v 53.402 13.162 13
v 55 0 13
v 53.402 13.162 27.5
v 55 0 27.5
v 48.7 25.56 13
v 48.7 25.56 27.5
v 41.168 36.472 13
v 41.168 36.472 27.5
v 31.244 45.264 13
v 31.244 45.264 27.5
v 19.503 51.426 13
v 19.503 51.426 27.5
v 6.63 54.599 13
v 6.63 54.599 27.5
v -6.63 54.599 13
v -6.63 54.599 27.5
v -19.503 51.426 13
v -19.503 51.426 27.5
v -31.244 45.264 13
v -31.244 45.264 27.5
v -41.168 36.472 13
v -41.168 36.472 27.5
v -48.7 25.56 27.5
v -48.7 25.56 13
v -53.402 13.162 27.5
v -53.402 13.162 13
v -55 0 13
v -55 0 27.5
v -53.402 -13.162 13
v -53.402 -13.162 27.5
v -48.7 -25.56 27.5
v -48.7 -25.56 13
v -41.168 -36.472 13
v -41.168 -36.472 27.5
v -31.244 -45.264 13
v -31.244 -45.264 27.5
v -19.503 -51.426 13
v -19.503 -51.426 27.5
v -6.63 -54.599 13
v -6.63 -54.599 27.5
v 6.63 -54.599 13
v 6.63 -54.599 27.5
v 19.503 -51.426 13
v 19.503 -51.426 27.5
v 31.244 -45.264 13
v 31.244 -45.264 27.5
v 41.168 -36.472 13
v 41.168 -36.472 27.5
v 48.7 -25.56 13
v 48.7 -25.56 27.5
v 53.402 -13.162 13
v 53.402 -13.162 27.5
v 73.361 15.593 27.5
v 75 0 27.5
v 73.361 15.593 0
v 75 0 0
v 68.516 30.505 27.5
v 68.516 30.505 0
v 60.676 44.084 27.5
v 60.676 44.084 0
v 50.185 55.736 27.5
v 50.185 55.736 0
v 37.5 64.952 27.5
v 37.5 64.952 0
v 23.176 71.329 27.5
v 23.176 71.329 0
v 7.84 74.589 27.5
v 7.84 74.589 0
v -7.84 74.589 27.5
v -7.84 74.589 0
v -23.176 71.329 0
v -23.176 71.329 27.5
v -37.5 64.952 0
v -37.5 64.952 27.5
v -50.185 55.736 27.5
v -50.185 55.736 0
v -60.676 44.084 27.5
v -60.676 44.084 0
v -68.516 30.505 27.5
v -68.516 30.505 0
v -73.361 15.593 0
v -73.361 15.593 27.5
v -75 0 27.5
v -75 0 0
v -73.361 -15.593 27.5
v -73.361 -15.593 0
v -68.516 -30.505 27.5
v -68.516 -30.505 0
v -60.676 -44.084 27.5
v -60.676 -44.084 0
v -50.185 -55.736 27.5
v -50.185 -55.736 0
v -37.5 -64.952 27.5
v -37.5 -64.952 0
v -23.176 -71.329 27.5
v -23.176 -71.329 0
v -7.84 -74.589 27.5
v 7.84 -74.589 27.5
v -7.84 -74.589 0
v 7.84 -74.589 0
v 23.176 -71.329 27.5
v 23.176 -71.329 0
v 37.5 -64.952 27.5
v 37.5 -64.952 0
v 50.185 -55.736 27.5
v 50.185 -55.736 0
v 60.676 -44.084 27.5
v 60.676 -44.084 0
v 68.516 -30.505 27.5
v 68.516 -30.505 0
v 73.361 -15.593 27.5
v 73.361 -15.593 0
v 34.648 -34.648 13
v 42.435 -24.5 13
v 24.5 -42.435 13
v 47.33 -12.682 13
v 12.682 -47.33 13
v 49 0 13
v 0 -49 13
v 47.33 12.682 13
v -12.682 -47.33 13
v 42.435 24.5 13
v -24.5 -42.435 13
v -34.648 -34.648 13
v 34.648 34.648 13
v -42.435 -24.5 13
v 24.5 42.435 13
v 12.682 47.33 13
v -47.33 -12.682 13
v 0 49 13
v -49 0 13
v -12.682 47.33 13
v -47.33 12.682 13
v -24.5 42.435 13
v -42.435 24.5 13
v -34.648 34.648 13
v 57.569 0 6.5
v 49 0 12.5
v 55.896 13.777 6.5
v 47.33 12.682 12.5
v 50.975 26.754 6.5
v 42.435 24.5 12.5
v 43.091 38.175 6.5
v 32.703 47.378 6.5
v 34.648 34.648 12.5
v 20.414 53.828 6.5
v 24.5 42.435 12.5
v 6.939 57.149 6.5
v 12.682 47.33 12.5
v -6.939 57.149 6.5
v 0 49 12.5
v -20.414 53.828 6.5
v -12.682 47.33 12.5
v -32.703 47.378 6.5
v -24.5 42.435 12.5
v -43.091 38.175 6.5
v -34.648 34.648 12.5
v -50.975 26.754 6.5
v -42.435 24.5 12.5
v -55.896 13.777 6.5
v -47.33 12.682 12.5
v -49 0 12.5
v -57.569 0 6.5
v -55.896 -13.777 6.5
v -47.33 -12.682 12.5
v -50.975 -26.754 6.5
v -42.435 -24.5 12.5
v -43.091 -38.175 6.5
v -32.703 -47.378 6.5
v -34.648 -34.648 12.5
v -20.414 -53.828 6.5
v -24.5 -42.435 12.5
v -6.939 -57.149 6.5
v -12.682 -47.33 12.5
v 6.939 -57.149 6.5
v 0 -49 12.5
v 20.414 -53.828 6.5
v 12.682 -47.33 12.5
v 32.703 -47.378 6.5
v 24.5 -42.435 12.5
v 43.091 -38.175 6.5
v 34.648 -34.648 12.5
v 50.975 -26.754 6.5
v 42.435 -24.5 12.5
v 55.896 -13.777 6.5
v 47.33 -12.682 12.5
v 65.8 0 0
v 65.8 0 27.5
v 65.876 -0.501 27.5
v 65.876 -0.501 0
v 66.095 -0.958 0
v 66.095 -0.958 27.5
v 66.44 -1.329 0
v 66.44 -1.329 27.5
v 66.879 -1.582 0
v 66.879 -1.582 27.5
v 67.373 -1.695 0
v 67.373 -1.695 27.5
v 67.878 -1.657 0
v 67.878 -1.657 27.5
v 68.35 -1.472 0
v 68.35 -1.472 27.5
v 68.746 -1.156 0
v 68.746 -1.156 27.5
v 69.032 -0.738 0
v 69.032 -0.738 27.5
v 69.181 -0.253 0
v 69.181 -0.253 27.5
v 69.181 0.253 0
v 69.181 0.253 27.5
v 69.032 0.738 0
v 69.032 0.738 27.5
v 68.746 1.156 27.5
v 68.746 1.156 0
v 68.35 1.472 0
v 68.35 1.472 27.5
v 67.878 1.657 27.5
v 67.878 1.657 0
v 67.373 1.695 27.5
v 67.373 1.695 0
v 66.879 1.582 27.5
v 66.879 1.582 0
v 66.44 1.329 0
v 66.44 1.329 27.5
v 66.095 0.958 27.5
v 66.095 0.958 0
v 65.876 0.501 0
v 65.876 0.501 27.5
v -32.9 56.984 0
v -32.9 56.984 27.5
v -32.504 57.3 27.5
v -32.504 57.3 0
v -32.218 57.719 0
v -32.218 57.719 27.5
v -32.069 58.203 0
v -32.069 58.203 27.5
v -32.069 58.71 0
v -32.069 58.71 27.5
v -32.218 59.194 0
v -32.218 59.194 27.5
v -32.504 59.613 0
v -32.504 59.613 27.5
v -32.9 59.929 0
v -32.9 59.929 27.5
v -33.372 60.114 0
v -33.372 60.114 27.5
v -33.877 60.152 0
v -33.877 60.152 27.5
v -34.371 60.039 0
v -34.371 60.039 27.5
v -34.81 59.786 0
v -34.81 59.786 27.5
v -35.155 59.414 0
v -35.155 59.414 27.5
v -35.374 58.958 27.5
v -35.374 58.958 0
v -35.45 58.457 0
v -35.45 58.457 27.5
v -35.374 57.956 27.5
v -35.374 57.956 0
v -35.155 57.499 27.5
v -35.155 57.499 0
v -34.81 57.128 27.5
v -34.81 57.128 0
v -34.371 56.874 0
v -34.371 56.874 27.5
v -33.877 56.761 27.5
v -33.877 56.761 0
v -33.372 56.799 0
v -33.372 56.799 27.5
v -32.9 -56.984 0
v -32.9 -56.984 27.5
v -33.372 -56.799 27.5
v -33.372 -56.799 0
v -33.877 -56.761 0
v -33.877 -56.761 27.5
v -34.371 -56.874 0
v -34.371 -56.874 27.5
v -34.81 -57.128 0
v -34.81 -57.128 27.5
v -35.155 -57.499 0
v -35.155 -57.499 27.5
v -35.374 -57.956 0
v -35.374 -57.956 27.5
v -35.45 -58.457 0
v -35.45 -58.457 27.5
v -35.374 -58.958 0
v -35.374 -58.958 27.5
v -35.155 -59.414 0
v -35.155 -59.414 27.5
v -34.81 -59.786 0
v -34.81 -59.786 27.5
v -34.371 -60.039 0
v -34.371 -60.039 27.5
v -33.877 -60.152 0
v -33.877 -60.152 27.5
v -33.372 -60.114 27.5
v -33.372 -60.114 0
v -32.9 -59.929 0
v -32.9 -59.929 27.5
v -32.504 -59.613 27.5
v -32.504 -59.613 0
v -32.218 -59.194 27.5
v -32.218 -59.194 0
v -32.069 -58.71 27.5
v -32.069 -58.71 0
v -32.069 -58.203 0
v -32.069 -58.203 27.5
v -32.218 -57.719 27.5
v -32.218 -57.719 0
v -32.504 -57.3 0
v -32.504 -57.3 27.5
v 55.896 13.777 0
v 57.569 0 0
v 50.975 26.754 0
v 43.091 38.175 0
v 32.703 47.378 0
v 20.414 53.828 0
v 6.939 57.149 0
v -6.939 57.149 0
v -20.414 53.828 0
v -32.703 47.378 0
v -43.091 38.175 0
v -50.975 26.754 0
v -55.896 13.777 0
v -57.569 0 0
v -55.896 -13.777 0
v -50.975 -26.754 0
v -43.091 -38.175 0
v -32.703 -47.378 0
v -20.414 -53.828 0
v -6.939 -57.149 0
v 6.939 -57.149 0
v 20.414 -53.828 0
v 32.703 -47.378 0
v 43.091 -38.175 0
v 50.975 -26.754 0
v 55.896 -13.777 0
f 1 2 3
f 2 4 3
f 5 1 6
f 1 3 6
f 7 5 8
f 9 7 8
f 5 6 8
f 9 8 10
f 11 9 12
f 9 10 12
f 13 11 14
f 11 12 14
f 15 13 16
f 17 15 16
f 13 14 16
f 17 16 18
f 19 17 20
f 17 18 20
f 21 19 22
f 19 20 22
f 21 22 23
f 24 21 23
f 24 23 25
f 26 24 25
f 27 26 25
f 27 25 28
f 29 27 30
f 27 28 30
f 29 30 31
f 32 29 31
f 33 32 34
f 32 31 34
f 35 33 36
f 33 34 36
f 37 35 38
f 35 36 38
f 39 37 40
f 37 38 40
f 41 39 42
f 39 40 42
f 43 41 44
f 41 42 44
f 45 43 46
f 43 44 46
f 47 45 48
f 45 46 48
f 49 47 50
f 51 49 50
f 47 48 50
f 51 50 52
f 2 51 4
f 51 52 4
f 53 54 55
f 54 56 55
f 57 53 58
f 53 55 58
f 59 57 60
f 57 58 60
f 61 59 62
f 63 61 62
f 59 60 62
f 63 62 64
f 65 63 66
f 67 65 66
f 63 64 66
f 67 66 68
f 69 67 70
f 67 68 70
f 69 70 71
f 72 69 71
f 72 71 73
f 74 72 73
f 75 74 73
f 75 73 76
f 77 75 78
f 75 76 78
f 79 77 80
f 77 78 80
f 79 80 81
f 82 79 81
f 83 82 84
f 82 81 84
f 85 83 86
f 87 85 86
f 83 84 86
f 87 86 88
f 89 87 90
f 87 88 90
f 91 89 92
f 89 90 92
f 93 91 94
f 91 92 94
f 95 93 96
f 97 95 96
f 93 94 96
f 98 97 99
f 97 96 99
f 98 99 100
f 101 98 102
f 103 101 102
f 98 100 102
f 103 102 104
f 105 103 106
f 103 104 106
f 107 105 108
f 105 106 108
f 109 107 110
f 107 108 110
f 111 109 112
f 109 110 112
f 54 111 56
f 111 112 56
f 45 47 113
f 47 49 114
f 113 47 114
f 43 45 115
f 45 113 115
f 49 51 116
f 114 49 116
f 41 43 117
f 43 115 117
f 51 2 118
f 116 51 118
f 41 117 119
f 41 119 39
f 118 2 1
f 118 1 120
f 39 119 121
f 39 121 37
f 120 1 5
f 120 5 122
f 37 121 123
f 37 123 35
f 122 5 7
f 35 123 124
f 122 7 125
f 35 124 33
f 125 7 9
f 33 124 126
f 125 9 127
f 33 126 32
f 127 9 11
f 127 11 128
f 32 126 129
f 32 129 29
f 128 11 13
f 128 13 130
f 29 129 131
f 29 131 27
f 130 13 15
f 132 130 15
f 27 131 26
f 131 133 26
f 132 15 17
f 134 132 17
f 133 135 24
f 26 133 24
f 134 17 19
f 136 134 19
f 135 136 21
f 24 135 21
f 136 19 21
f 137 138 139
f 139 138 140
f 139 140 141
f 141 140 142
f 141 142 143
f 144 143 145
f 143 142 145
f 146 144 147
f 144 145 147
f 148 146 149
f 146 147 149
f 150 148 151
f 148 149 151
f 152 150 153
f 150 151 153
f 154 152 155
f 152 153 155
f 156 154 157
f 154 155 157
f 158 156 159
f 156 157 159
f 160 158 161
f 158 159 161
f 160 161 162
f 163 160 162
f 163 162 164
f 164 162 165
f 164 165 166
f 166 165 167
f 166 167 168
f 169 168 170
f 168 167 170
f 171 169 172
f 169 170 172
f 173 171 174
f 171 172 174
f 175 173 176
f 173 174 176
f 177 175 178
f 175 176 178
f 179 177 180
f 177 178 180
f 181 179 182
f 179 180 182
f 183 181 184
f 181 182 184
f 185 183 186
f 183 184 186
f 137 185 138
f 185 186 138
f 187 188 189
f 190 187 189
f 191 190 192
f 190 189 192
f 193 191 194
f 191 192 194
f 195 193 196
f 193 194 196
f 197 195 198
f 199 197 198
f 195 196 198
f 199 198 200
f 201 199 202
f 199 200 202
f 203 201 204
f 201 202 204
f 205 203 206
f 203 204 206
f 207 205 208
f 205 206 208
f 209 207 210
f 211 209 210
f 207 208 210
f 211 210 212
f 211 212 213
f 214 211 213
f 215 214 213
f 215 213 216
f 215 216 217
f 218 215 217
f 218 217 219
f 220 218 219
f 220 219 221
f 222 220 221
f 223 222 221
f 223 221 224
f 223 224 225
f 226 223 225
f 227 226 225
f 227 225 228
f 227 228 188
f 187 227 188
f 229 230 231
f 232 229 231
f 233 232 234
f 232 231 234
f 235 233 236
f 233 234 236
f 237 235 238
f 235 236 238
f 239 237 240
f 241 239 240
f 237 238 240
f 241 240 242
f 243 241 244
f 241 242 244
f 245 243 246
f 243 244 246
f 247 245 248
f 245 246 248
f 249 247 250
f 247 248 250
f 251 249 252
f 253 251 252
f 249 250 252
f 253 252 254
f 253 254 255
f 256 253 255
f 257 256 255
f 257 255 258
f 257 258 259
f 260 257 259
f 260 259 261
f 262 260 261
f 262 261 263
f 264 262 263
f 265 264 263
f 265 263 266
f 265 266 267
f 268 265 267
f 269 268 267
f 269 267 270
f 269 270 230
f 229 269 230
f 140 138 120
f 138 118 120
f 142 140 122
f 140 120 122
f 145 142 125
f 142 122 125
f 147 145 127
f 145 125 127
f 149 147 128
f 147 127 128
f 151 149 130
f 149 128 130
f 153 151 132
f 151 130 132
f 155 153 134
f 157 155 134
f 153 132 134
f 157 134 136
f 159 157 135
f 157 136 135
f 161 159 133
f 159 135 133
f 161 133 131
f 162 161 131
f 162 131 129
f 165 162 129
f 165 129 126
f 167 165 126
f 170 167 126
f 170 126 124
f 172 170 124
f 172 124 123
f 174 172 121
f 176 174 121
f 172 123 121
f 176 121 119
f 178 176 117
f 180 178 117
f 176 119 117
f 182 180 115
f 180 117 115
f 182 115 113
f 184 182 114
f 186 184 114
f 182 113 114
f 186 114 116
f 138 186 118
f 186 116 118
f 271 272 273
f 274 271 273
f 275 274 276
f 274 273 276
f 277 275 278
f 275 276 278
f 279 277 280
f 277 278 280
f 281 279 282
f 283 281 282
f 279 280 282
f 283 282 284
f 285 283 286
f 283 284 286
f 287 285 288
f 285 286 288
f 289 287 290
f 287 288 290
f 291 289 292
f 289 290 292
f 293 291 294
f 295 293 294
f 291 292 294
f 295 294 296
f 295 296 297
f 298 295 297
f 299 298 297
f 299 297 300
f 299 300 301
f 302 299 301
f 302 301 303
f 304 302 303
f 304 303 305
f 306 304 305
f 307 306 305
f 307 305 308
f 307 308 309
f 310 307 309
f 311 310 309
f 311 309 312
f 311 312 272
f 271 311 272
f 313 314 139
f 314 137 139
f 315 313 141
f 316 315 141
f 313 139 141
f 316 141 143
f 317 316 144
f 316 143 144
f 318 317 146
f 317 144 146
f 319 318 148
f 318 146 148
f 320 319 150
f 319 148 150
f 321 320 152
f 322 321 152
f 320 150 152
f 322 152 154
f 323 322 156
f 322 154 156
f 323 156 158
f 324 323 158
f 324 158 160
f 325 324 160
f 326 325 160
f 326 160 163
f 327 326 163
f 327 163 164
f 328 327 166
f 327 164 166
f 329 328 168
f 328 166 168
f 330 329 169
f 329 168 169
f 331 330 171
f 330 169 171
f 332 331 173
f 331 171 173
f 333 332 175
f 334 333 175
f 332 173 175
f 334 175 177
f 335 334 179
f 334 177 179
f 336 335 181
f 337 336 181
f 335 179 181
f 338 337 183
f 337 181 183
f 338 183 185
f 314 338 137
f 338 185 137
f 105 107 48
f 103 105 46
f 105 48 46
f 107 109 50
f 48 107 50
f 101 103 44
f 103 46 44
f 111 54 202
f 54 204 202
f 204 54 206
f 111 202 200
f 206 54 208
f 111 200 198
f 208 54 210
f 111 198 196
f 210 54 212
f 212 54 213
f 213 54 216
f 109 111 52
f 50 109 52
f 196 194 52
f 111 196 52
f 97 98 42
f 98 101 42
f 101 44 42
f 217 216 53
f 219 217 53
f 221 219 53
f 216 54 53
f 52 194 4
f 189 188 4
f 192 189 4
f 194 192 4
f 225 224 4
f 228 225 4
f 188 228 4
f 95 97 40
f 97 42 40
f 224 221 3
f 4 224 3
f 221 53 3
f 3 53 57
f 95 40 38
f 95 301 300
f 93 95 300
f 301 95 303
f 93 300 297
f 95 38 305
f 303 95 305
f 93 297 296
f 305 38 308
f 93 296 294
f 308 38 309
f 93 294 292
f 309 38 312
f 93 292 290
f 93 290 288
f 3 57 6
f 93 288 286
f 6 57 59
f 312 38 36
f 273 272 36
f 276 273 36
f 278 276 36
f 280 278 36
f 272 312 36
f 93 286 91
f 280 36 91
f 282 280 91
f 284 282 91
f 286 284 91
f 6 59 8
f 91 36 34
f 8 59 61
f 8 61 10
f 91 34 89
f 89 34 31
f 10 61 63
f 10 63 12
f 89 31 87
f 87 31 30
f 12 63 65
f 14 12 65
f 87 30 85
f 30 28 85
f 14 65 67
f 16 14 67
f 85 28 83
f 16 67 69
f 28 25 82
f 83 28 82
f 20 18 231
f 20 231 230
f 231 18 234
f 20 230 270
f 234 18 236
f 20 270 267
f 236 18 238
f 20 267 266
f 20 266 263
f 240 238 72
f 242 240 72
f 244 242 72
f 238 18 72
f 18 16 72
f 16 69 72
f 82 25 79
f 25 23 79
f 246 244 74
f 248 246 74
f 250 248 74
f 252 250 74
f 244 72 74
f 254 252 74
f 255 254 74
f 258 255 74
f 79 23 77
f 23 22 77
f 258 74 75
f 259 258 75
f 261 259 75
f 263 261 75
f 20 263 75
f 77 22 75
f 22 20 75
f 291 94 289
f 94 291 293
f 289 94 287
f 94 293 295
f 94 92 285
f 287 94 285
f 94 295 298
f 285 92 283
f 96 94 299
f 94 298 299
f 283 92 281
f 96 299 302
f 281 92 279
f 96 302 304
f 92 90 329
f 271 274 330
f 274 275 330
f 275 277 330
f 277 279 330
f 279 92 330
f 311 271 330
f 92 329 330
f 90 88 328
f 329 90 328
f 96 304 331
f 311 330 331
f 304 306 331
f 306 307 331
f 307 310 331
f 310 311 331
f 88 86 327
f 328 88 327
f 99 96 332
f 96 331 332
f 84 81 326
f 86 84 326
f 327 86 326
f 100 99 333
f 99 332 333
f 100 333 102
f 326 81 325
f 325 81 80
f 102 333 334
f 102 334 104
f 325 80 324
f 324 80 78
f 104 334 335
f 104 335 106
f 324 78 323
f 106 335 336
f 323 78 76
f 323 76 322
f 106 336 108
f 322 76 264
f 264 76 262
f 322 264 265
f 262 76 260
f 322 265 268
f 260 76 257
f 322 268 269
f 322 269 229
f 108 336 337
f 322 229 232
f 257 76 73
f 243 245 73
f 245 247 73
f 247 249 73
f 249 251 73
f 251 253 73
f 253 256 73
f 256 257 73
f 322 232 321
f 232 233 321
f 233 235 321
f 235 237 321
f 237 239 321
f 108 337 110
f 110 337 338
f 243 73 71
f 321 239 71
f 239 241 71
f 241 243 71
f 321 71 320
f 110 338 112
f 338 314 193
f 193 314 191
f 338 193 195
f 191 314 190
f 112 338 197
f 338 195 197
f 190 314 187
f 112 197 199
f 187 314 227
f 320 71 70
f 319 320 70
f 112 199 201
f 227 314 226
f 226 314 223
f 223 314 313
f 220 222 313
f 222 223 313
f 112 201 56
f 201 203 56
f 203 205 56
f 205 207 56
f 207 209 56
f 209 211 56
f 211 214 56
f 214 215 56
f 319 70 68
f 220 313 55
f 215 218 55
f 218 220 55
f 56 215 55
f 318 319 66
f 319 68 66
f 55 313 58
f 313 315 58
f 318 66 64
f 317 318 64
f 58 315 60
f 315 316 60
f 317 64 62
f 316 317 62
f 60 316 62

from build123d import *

# Parameters (mm, degrees)
SKETCH001_R        = 1.7
POCKET_DEPTH       = 455.315212
POLARPATTERN_COUNT = 3


with BuildPart() as part:
    # Sketch → Revolution (revolve)
    with BuildSketch(Plane.XZ):
        Polygon((55, 13), (55, 27.5), (75, 27.5), (75, 0), (57.568888, 0), (57.568888, 6.5), (49, 12.5), (49, 13), align=None)
    revolve(axis=Axis((0, 0, 0), (0, 0, 1)))

    # Sketch001 (on Face2 of Revolution) → Pocket (cut, through all)
    with BuildSketch(Plane(origin=(0, 0, 27.5), x_dir=(-1, 0, 0), z_dir=(0, 0, 1))):
        with Locations((-67.5, 0)):
            Circle(SKETCH001_R)
    pocket = extrude(amount=-POCKET_DEPTH, mode=Mode.SUBTRACT)

    # PolarPattern: Pocket ×3 about axis
    polarpattern_axis = Axis((0, 0, 27.5), (0, 0, 1))
    for i in range(1, POLARPATTERN_COUNT):
        add(pocket.rotate(polarpattern_axis, i * 360 / POLARPATTERN_COUNT), mode=Mode.SUBTRACT)


solid = part.part
